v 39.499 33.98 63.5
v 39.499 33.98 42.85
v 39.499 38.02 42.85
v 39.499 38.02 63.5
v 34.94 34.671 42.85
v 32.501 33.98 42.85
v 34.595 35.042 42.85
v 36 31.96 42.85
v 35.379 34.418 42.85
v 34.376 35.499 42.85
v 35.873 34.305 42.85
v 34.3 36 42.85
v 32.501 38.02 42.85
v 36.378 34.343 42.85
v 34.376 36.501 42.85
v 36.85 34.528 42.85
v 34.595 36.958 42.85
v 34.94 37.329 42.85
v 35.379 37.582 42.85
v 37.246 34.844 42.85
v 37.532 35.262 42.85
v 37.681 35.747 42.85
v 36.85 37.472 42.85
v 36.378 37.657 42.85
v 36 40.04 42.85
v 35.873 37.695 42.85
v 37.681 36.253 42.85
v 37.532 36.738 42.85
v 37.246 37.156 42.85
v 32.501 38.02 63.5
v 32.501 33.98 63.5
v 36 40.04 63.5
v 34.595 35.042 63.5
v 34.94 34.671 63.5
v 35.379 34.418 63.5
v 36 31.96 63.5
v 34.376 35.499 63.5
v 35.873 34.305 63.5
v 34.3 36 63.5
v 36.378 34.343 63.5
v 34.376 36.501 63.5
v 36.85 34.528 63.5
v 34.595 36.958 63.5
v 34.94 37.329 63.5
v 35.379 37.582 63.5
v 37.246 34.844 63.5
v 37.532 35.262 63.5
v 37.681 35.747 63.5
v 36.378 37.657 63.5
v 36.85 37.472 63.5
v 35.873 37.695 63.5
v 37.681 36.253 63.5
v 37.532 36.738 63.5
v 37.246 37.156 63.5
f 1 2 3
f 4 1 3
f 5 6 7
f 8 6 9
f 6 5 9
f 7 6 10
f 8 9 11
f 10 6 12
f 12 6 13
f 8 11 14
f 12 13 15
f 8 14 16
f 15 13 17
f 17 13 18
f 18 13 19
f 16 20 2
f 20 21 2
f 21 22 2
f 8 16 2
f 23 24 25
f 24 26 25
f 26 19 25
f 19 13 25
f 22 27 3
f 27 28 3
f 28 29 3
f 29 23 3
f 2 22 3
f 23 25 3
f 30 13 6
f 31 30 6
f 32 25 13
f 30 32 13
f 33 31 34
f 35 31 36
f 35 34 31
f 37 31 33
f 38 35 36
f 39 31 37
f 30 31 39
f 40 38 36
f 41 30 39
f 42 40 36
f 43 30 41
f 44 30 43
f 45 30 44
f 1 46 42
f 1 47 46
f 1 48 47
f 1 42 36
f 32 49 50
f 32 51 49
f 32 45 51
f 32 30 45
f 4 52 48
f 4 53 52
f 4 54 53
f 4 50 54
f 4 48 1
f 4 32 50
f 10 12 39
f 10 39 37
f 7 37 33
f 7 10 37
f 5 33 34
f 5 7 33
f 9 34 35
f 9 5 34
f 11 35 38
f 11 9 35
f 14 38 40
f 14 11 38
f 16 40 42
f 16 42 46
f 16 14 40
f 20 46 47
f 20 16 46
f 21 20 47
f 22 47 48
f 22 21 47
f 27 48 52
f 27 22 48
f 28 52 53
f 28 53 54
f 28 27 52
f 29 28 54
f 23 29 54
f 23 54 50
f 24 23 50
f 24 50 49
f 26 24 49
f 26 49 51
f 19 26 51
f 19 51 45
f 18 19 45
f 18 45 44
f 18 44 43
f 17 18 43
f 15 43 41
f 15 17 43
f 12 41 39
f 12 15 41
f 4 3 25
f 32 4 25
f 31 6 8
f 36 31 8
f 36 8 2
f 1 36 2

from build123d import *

# Parameters (mm, degrees)
HEX_7_START    = 42.85
HEX_7_DEPTH    = 20.65
ROSCA_M4_START = 42.85
CROQUIS2_R     = 1.7
ROSCA_M4_DEPTH = 20.65


with BuildPart() as part:
    # Croquis1 → Hex_7 (new body)
    with BuildSketch(Plane.XY.offset(HEX_7_START)):
        Polygon((39.498742631, 38.02), (36, 40.04), (32.501257369, 38.02), (32.501257369, 33.98), (36, 31.96), (39.498742631, 33.98), align=None)
    extrude(amount=HEX_7_DEPTH)

    # Croquis2 → Rosca_M4 (cut)
    with BuildSketch(Plane.XY.offset(ROSCA_M4_START)):
        with Locations(Location((36, 36, 0), (0, 0, 180))):
            Circle(CROQUIS2_R)
    extrude(amount=ROSCA_M4_DEPTH, mode=Mode.SUBTRACT)


solid = part.part
